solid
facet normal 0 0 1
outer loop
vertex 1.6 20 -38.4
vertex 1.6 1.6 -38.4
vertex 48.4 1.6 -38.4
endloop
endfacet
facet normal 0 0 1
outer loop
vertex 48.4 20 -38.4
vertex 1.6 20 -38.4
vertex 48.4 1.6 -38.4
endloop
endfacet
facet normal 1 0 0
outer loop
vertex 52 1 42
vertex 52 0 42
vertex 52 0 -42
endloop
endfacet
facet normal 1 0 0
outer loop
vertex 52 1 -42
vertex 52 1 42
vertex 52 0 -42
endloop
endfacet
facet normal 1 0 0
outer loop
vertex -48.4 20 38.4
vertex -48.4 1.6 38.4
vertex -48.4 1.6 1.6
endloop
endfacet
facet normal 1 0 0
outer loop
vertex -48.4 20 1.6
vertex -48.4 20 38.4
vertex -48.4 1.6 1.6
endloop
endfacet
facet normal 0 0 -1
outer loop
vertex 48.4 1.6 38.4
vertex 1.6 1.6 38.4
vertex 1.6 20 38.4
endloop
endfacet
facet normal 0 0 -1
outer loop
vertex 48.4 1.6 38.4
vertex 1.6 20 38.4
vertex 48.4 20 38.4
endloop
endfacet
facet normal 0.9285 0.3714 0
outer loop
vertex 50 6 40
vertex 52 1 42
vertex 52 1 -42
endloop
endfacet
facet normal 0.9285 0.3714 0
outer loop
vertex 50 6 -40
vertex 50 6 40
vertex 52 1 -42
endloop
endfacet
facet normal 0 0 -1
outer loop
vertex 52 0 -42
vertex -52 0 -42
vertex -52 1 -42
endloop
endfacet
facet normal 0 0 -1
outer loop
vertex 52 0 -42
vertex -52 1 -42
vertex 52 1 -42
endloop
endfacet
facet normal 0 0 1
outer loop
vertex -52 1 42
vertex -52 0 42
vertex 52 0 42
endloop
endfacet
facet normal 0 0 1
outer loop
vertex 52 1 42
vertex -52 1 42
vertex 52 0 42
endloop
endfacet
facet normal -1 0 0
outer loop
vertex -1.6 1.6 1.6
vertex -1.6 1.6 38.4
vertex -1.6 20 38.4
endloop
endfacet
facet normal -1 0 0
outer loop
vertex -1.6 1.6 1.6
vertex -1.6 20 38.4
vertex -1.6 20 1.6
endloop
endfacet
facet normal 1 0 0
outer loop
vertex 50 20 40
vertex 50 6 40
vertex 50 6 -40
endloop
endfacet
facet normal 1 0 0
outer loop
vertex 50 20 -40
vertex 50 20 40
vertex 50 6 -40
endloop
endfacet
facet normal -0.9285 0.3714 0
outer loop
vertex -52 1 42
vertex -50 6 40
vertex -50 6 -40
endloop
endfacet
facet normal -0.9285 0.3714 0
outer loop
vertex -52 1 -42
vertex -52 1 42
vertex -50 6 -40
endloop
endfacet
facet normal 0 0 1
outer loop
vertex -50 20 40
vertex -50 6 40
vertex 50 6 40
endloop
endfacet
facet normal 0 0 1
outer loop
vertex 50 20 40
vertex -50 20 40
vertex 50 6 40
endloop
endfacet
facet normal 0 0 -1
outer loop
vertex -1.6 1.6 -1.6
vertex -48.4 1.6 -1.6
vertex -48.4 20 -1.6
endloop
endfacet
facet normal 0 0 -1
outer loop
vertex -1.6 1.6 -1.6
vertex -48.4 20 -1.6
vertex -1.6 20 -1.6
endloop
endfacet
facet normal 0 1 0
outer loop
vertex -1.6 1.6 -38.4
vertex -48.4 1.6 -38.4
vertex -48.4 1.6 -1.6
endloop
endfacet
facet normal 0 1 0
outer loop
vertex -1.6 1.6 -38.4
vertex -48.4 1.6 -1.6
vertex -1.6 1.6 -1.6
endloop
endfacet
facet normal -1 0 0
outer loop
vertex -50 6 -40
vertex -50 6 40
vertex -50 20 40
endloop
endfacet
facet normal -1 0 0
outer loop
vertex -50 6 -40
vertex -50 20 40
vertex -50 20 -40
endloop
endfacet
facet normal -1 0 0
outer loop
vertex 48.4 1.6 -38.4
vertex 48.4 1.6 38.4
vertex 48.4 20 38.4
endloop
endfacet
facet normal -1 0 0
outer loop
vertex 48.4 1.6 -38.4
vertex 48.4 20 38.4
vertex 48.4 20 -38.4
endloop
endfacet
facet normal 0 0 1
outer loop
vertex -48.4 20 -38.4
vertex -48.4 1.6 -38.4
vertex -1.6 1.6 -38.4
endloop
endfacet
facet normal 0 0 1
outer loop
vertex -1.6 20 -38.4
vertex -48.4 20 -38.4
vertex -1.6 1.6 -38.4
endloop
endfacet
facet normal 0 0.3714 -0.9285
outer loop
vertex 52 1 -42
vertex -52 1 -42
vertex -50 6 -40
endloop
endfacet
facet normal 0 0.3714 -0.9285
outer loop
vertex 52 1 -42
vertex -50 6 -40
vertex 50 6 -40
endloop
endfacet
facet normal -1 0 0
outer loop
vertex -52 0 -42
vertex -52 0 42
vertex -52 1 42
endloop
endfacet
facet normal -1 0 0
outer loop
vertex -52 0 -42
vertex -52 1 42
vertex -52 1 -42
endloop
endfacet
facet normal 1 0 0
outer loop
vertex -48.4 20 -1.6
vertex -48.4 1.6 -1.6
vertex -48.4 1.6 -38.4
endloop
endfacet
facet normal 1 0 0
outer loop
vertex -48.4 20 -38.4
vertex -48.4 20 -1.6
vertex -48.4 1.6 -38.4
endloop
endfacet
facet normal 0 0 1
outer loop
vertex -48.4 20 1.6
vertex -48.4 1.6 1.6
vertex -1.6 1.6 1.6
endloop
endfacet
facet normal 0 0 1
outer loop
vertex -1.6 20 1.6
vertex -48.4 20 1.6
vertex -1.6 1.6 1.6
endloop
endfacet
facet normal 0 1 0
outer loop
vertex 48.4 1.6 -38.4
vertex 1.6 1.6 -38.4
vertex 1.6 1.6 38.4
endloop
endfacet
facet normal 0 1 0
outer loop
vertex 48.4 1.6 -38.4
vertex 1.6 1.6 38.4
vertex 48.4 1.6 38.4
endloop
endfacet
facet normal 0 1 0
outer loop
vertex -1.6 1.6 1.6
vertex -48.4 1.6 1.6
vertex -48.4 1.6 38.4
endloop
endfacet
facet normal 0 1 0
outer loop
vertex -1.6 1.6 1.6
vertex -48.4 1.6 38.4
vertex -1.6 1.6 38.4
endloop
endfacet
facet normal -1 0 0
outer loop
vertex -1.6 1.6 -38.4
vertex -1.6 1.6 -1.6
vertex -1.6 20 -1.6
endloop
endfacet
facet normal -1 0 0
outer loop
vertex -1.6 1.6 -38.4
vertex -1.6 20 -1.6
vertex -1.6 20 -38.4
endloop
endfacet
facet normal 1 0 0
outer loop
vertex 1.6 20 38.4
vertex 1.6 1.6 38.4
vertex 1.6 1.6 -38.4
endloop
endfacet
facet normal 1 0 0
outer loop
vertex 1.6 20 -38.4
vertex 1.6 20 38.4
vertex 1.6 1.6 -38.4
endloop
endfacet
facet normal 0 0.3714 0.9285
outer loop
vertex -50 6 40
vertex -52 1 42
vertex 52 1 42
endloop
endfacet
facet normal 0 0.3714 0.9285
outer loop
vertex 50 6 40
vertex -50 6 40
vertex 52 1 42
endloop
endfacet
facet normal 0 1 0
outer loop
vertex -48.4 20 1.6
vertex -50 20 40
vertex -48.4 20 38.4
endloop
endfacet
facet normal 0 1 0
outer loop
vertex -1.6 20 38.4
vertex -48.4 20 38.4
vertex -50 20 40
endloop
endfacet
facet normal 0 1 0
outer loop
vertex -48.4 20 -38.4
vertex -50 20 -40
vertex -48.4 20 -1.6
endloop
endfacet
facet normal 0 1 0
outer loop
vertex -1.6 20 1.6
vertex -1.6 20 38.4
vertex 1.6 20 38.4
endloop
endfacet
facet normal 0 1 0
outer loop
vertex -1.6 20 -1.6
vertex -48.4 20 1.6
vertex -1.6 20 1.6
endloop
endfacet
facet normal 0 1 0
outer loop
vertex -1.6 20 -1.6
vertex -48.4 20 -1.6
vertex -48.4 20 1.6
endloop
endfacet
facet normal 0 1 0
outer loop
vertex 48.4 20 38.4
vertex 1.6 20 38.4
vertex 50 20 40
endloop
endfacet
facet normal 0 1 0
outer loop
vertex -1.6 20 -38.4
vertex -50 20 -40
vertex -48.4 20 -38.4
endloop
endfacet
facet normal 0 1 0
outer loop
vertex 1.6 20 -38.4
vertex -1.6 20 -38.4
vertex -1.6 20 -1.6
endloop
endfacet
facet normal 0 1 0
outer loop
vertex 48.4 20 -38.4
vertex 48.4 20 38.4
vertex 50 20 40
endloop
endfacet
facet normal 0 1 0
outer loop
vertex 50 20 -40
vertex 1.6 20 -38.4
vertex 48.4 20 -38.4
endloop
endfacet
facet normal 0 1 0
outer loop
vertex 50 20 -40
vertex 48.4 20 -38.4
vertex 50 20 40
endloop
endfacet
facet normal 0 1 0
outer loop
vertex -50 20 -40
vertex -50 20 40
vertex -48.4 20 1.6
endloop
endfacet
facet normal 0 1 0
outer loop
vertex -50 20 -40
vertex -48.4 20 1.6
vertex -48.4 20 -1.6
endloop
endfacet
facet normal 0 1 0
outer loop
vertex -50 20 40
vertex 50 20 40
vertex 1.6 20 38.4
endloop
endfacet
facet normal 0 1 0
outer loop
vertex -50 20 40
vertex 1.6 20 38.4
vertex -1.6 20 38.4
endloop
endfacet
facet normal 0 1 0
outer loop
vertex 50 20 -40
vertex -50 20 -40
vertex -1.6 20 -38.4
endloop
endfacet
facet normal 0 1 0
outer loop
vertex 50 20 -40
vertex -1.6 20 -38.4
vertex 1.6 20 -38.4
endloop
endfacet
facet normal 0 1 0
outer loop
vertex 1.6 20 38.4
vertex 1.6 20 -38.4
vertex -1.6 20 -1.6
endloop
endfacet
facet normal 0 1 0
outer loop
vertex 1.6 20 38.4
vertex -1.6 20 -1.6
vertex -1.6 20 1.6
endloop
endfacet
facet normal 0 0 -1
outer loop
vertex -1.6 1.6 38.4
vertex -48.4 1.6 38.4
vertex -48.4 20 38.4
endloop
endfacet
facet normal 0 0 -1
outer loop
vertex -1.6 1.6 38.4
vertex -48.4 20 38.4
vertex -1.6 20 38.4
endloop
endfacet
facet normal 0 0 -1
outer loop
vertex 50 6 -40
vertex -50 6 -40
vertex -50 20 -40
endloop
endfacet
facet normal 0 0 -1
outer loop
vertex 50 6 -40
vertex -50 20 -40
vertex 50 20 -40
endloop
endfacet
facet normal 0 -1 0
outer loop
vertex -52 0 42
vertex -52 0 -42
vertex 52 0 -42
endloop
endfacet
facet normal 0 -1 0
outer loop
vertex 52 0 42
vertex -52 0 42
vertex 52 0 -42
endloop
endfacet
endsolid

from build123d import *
from OCP.BRepFilletAPI import BRepFilletAPI_MakeChamfer

# Parameters (mm, degrees)
SKICA1_W                = 100
SKICA1_H                = 80
SKICA1_W_2              = 46.8
SKICA1_H_2              = 36.8
SKICA1_H_3              = 76.8
P_IDAT_VYSUNUT_M1_DEPTH = 20
SKICA1_6_W              = 104
SKICA1_6_H              = 84
P_IDAT_VYSUNUT_M3_DEPTH = 1.6
SKICA1_7_W              = 104
SKICA1_7_H              = 84
SKICA1_7_W_2            = 100
SKICA1_7_H_2            = 80
P_IDAT_VYSUNUT_M4_DEPTH = 6
ZKOSEN_14_SIZE          = 2
ZKOSEN_14_SIZE_2        = 5


with BuildPart() as part:
    # Skica1 → Přidat vysunutím1 (new body)
    with BuildSketch(Plane(origin=(0, 0, 0), x_dir=(1, 0, 0), z_dir=(0, 1, 0))):
        Rectangle(SKICA1_W, SKICA1_H)
        with Locations((-25, 20)):
            Rectangle(SKICA1_W_2, SKICA1_H_2, mode=Mode.SUBTRACT)
        with Locations((-25, -20)):
            Rectangle(SKICA1_W_2, SKICA1_H_2, mode=Mode.SUBTRACT)
        with Locations((25, 0)):
            Rectangle(SKICA1_W_2, SKICA1_H_3, mode=Mode.SUBTRACT)
    extrude(amount=P_IDAT_VYSUNUT_M1_DEPTH)

    # Skica1<6> → Přidat vysunutím3 (add)
    with BuildSketch(Plane(origin=(0, 0, 0), x_dir=(1, 0, 0), z_dir=(0, 1, 0))):
        Rectangle(SKICA1_6_W, SKICA1_6_H)
    extrude(amount=P_IDAT_VYSUNUT_M3_DEPTH)

    # Skica1<7> → Přidat vysunutím4 (add)
    with BuildSketch(Plane(origin=(0, 0, 0), x_dir=(1, 0, 0), z_dir=(0, 1, 0))):
        Rectangle(SKICA1_7_W, SKICA1_7_H)
        Rectangle(SKICA1_7_W_2, SKICA1_7_H_2, mode=Mode.SUBTRACT)
    extrude(amount=P_IDAT_VYSUNUT_M4_DEPTH)

    # Zkosení14
    zkosen_14_edges_1 = [part.edges().sort_by_distance(p)[0] for p in [
        (52, 6, 0),
    ]]
    zkosen_14_side_1 = [part.faces().sort_by_distance(p)[0] for p in [
        (51.96, 6, 0),
    ]]
    zkosen_14_edges_2 = [part.edges().sort_by_distance(p)[0] for p in [
        (0, 6, -42),
    ]]
    zkosen_14_side_2 = [part.faces().sort_by_distance(p)[0] for p in [
        (0, 6, -41.96),
    ]]
    zkosen_14_edges_3 = [part.edges().sort_by_distance(p)[0] for p in [
        (-52, 6, 0),
    ]]
    zkosen_14_side_3 = [part.faces().sort_by_distance(p)[0] for p in [
        (-52, 5.96, 0),
    ]]
    zkosen_14_edges_4 = [part.edges().sort_by_distance(p)[0] for p in [
        (0, 6, 42),
    ]]
    zkosen_14_side_4 = [part.faces().sort_by_distance(p)[0] for p in [
        (0, 6, 41.96),
    ]]
    zkosen_14 = BRepFilletAPI_MakeChamfer(part.part.solid().wrapped)
    for e in zkosen_14_edges_1:
        zkosen_14.Add(ZKOSEN_14_SIZE - 0.0001, ZKOSEN_14_SIZE_2 - 0.0001, e.wrapped, zkosen_14_side_1[0].wrapped)
    for e in zkosen_14_edges_2:
        zkosen_14.Add(ZKOSEN_14_SIZE - 0.0001, ZKOSEN_14_SIZE_2 - 0.0001, e.wrapped, zkosen_14_side_2[0].wrapped)
    for e in zkosen_14_edges_3:
        zkosen_14.Add(ZKOSEN_14_SIZE_2 - 0.0001, ZKOSEN_14_SIZE - 0.0001, e.wrapped, zkosen_14_side_3[0].wrapped)
    for e in zkosen_14_edges_4:
        zkosen_14.Add(ZKOSEN_14_SIZE - 0.0001, ZKOSEN_14_SIZE_2 - 0.0001, e.wrapped, zkosen_14_side_4[0].wrapped)
    add(Compound.cast(zkosen_14.Shape()), mode=Mode.REPLACE)  # a hair under: the kernel refuses the full size


solid = part.part
